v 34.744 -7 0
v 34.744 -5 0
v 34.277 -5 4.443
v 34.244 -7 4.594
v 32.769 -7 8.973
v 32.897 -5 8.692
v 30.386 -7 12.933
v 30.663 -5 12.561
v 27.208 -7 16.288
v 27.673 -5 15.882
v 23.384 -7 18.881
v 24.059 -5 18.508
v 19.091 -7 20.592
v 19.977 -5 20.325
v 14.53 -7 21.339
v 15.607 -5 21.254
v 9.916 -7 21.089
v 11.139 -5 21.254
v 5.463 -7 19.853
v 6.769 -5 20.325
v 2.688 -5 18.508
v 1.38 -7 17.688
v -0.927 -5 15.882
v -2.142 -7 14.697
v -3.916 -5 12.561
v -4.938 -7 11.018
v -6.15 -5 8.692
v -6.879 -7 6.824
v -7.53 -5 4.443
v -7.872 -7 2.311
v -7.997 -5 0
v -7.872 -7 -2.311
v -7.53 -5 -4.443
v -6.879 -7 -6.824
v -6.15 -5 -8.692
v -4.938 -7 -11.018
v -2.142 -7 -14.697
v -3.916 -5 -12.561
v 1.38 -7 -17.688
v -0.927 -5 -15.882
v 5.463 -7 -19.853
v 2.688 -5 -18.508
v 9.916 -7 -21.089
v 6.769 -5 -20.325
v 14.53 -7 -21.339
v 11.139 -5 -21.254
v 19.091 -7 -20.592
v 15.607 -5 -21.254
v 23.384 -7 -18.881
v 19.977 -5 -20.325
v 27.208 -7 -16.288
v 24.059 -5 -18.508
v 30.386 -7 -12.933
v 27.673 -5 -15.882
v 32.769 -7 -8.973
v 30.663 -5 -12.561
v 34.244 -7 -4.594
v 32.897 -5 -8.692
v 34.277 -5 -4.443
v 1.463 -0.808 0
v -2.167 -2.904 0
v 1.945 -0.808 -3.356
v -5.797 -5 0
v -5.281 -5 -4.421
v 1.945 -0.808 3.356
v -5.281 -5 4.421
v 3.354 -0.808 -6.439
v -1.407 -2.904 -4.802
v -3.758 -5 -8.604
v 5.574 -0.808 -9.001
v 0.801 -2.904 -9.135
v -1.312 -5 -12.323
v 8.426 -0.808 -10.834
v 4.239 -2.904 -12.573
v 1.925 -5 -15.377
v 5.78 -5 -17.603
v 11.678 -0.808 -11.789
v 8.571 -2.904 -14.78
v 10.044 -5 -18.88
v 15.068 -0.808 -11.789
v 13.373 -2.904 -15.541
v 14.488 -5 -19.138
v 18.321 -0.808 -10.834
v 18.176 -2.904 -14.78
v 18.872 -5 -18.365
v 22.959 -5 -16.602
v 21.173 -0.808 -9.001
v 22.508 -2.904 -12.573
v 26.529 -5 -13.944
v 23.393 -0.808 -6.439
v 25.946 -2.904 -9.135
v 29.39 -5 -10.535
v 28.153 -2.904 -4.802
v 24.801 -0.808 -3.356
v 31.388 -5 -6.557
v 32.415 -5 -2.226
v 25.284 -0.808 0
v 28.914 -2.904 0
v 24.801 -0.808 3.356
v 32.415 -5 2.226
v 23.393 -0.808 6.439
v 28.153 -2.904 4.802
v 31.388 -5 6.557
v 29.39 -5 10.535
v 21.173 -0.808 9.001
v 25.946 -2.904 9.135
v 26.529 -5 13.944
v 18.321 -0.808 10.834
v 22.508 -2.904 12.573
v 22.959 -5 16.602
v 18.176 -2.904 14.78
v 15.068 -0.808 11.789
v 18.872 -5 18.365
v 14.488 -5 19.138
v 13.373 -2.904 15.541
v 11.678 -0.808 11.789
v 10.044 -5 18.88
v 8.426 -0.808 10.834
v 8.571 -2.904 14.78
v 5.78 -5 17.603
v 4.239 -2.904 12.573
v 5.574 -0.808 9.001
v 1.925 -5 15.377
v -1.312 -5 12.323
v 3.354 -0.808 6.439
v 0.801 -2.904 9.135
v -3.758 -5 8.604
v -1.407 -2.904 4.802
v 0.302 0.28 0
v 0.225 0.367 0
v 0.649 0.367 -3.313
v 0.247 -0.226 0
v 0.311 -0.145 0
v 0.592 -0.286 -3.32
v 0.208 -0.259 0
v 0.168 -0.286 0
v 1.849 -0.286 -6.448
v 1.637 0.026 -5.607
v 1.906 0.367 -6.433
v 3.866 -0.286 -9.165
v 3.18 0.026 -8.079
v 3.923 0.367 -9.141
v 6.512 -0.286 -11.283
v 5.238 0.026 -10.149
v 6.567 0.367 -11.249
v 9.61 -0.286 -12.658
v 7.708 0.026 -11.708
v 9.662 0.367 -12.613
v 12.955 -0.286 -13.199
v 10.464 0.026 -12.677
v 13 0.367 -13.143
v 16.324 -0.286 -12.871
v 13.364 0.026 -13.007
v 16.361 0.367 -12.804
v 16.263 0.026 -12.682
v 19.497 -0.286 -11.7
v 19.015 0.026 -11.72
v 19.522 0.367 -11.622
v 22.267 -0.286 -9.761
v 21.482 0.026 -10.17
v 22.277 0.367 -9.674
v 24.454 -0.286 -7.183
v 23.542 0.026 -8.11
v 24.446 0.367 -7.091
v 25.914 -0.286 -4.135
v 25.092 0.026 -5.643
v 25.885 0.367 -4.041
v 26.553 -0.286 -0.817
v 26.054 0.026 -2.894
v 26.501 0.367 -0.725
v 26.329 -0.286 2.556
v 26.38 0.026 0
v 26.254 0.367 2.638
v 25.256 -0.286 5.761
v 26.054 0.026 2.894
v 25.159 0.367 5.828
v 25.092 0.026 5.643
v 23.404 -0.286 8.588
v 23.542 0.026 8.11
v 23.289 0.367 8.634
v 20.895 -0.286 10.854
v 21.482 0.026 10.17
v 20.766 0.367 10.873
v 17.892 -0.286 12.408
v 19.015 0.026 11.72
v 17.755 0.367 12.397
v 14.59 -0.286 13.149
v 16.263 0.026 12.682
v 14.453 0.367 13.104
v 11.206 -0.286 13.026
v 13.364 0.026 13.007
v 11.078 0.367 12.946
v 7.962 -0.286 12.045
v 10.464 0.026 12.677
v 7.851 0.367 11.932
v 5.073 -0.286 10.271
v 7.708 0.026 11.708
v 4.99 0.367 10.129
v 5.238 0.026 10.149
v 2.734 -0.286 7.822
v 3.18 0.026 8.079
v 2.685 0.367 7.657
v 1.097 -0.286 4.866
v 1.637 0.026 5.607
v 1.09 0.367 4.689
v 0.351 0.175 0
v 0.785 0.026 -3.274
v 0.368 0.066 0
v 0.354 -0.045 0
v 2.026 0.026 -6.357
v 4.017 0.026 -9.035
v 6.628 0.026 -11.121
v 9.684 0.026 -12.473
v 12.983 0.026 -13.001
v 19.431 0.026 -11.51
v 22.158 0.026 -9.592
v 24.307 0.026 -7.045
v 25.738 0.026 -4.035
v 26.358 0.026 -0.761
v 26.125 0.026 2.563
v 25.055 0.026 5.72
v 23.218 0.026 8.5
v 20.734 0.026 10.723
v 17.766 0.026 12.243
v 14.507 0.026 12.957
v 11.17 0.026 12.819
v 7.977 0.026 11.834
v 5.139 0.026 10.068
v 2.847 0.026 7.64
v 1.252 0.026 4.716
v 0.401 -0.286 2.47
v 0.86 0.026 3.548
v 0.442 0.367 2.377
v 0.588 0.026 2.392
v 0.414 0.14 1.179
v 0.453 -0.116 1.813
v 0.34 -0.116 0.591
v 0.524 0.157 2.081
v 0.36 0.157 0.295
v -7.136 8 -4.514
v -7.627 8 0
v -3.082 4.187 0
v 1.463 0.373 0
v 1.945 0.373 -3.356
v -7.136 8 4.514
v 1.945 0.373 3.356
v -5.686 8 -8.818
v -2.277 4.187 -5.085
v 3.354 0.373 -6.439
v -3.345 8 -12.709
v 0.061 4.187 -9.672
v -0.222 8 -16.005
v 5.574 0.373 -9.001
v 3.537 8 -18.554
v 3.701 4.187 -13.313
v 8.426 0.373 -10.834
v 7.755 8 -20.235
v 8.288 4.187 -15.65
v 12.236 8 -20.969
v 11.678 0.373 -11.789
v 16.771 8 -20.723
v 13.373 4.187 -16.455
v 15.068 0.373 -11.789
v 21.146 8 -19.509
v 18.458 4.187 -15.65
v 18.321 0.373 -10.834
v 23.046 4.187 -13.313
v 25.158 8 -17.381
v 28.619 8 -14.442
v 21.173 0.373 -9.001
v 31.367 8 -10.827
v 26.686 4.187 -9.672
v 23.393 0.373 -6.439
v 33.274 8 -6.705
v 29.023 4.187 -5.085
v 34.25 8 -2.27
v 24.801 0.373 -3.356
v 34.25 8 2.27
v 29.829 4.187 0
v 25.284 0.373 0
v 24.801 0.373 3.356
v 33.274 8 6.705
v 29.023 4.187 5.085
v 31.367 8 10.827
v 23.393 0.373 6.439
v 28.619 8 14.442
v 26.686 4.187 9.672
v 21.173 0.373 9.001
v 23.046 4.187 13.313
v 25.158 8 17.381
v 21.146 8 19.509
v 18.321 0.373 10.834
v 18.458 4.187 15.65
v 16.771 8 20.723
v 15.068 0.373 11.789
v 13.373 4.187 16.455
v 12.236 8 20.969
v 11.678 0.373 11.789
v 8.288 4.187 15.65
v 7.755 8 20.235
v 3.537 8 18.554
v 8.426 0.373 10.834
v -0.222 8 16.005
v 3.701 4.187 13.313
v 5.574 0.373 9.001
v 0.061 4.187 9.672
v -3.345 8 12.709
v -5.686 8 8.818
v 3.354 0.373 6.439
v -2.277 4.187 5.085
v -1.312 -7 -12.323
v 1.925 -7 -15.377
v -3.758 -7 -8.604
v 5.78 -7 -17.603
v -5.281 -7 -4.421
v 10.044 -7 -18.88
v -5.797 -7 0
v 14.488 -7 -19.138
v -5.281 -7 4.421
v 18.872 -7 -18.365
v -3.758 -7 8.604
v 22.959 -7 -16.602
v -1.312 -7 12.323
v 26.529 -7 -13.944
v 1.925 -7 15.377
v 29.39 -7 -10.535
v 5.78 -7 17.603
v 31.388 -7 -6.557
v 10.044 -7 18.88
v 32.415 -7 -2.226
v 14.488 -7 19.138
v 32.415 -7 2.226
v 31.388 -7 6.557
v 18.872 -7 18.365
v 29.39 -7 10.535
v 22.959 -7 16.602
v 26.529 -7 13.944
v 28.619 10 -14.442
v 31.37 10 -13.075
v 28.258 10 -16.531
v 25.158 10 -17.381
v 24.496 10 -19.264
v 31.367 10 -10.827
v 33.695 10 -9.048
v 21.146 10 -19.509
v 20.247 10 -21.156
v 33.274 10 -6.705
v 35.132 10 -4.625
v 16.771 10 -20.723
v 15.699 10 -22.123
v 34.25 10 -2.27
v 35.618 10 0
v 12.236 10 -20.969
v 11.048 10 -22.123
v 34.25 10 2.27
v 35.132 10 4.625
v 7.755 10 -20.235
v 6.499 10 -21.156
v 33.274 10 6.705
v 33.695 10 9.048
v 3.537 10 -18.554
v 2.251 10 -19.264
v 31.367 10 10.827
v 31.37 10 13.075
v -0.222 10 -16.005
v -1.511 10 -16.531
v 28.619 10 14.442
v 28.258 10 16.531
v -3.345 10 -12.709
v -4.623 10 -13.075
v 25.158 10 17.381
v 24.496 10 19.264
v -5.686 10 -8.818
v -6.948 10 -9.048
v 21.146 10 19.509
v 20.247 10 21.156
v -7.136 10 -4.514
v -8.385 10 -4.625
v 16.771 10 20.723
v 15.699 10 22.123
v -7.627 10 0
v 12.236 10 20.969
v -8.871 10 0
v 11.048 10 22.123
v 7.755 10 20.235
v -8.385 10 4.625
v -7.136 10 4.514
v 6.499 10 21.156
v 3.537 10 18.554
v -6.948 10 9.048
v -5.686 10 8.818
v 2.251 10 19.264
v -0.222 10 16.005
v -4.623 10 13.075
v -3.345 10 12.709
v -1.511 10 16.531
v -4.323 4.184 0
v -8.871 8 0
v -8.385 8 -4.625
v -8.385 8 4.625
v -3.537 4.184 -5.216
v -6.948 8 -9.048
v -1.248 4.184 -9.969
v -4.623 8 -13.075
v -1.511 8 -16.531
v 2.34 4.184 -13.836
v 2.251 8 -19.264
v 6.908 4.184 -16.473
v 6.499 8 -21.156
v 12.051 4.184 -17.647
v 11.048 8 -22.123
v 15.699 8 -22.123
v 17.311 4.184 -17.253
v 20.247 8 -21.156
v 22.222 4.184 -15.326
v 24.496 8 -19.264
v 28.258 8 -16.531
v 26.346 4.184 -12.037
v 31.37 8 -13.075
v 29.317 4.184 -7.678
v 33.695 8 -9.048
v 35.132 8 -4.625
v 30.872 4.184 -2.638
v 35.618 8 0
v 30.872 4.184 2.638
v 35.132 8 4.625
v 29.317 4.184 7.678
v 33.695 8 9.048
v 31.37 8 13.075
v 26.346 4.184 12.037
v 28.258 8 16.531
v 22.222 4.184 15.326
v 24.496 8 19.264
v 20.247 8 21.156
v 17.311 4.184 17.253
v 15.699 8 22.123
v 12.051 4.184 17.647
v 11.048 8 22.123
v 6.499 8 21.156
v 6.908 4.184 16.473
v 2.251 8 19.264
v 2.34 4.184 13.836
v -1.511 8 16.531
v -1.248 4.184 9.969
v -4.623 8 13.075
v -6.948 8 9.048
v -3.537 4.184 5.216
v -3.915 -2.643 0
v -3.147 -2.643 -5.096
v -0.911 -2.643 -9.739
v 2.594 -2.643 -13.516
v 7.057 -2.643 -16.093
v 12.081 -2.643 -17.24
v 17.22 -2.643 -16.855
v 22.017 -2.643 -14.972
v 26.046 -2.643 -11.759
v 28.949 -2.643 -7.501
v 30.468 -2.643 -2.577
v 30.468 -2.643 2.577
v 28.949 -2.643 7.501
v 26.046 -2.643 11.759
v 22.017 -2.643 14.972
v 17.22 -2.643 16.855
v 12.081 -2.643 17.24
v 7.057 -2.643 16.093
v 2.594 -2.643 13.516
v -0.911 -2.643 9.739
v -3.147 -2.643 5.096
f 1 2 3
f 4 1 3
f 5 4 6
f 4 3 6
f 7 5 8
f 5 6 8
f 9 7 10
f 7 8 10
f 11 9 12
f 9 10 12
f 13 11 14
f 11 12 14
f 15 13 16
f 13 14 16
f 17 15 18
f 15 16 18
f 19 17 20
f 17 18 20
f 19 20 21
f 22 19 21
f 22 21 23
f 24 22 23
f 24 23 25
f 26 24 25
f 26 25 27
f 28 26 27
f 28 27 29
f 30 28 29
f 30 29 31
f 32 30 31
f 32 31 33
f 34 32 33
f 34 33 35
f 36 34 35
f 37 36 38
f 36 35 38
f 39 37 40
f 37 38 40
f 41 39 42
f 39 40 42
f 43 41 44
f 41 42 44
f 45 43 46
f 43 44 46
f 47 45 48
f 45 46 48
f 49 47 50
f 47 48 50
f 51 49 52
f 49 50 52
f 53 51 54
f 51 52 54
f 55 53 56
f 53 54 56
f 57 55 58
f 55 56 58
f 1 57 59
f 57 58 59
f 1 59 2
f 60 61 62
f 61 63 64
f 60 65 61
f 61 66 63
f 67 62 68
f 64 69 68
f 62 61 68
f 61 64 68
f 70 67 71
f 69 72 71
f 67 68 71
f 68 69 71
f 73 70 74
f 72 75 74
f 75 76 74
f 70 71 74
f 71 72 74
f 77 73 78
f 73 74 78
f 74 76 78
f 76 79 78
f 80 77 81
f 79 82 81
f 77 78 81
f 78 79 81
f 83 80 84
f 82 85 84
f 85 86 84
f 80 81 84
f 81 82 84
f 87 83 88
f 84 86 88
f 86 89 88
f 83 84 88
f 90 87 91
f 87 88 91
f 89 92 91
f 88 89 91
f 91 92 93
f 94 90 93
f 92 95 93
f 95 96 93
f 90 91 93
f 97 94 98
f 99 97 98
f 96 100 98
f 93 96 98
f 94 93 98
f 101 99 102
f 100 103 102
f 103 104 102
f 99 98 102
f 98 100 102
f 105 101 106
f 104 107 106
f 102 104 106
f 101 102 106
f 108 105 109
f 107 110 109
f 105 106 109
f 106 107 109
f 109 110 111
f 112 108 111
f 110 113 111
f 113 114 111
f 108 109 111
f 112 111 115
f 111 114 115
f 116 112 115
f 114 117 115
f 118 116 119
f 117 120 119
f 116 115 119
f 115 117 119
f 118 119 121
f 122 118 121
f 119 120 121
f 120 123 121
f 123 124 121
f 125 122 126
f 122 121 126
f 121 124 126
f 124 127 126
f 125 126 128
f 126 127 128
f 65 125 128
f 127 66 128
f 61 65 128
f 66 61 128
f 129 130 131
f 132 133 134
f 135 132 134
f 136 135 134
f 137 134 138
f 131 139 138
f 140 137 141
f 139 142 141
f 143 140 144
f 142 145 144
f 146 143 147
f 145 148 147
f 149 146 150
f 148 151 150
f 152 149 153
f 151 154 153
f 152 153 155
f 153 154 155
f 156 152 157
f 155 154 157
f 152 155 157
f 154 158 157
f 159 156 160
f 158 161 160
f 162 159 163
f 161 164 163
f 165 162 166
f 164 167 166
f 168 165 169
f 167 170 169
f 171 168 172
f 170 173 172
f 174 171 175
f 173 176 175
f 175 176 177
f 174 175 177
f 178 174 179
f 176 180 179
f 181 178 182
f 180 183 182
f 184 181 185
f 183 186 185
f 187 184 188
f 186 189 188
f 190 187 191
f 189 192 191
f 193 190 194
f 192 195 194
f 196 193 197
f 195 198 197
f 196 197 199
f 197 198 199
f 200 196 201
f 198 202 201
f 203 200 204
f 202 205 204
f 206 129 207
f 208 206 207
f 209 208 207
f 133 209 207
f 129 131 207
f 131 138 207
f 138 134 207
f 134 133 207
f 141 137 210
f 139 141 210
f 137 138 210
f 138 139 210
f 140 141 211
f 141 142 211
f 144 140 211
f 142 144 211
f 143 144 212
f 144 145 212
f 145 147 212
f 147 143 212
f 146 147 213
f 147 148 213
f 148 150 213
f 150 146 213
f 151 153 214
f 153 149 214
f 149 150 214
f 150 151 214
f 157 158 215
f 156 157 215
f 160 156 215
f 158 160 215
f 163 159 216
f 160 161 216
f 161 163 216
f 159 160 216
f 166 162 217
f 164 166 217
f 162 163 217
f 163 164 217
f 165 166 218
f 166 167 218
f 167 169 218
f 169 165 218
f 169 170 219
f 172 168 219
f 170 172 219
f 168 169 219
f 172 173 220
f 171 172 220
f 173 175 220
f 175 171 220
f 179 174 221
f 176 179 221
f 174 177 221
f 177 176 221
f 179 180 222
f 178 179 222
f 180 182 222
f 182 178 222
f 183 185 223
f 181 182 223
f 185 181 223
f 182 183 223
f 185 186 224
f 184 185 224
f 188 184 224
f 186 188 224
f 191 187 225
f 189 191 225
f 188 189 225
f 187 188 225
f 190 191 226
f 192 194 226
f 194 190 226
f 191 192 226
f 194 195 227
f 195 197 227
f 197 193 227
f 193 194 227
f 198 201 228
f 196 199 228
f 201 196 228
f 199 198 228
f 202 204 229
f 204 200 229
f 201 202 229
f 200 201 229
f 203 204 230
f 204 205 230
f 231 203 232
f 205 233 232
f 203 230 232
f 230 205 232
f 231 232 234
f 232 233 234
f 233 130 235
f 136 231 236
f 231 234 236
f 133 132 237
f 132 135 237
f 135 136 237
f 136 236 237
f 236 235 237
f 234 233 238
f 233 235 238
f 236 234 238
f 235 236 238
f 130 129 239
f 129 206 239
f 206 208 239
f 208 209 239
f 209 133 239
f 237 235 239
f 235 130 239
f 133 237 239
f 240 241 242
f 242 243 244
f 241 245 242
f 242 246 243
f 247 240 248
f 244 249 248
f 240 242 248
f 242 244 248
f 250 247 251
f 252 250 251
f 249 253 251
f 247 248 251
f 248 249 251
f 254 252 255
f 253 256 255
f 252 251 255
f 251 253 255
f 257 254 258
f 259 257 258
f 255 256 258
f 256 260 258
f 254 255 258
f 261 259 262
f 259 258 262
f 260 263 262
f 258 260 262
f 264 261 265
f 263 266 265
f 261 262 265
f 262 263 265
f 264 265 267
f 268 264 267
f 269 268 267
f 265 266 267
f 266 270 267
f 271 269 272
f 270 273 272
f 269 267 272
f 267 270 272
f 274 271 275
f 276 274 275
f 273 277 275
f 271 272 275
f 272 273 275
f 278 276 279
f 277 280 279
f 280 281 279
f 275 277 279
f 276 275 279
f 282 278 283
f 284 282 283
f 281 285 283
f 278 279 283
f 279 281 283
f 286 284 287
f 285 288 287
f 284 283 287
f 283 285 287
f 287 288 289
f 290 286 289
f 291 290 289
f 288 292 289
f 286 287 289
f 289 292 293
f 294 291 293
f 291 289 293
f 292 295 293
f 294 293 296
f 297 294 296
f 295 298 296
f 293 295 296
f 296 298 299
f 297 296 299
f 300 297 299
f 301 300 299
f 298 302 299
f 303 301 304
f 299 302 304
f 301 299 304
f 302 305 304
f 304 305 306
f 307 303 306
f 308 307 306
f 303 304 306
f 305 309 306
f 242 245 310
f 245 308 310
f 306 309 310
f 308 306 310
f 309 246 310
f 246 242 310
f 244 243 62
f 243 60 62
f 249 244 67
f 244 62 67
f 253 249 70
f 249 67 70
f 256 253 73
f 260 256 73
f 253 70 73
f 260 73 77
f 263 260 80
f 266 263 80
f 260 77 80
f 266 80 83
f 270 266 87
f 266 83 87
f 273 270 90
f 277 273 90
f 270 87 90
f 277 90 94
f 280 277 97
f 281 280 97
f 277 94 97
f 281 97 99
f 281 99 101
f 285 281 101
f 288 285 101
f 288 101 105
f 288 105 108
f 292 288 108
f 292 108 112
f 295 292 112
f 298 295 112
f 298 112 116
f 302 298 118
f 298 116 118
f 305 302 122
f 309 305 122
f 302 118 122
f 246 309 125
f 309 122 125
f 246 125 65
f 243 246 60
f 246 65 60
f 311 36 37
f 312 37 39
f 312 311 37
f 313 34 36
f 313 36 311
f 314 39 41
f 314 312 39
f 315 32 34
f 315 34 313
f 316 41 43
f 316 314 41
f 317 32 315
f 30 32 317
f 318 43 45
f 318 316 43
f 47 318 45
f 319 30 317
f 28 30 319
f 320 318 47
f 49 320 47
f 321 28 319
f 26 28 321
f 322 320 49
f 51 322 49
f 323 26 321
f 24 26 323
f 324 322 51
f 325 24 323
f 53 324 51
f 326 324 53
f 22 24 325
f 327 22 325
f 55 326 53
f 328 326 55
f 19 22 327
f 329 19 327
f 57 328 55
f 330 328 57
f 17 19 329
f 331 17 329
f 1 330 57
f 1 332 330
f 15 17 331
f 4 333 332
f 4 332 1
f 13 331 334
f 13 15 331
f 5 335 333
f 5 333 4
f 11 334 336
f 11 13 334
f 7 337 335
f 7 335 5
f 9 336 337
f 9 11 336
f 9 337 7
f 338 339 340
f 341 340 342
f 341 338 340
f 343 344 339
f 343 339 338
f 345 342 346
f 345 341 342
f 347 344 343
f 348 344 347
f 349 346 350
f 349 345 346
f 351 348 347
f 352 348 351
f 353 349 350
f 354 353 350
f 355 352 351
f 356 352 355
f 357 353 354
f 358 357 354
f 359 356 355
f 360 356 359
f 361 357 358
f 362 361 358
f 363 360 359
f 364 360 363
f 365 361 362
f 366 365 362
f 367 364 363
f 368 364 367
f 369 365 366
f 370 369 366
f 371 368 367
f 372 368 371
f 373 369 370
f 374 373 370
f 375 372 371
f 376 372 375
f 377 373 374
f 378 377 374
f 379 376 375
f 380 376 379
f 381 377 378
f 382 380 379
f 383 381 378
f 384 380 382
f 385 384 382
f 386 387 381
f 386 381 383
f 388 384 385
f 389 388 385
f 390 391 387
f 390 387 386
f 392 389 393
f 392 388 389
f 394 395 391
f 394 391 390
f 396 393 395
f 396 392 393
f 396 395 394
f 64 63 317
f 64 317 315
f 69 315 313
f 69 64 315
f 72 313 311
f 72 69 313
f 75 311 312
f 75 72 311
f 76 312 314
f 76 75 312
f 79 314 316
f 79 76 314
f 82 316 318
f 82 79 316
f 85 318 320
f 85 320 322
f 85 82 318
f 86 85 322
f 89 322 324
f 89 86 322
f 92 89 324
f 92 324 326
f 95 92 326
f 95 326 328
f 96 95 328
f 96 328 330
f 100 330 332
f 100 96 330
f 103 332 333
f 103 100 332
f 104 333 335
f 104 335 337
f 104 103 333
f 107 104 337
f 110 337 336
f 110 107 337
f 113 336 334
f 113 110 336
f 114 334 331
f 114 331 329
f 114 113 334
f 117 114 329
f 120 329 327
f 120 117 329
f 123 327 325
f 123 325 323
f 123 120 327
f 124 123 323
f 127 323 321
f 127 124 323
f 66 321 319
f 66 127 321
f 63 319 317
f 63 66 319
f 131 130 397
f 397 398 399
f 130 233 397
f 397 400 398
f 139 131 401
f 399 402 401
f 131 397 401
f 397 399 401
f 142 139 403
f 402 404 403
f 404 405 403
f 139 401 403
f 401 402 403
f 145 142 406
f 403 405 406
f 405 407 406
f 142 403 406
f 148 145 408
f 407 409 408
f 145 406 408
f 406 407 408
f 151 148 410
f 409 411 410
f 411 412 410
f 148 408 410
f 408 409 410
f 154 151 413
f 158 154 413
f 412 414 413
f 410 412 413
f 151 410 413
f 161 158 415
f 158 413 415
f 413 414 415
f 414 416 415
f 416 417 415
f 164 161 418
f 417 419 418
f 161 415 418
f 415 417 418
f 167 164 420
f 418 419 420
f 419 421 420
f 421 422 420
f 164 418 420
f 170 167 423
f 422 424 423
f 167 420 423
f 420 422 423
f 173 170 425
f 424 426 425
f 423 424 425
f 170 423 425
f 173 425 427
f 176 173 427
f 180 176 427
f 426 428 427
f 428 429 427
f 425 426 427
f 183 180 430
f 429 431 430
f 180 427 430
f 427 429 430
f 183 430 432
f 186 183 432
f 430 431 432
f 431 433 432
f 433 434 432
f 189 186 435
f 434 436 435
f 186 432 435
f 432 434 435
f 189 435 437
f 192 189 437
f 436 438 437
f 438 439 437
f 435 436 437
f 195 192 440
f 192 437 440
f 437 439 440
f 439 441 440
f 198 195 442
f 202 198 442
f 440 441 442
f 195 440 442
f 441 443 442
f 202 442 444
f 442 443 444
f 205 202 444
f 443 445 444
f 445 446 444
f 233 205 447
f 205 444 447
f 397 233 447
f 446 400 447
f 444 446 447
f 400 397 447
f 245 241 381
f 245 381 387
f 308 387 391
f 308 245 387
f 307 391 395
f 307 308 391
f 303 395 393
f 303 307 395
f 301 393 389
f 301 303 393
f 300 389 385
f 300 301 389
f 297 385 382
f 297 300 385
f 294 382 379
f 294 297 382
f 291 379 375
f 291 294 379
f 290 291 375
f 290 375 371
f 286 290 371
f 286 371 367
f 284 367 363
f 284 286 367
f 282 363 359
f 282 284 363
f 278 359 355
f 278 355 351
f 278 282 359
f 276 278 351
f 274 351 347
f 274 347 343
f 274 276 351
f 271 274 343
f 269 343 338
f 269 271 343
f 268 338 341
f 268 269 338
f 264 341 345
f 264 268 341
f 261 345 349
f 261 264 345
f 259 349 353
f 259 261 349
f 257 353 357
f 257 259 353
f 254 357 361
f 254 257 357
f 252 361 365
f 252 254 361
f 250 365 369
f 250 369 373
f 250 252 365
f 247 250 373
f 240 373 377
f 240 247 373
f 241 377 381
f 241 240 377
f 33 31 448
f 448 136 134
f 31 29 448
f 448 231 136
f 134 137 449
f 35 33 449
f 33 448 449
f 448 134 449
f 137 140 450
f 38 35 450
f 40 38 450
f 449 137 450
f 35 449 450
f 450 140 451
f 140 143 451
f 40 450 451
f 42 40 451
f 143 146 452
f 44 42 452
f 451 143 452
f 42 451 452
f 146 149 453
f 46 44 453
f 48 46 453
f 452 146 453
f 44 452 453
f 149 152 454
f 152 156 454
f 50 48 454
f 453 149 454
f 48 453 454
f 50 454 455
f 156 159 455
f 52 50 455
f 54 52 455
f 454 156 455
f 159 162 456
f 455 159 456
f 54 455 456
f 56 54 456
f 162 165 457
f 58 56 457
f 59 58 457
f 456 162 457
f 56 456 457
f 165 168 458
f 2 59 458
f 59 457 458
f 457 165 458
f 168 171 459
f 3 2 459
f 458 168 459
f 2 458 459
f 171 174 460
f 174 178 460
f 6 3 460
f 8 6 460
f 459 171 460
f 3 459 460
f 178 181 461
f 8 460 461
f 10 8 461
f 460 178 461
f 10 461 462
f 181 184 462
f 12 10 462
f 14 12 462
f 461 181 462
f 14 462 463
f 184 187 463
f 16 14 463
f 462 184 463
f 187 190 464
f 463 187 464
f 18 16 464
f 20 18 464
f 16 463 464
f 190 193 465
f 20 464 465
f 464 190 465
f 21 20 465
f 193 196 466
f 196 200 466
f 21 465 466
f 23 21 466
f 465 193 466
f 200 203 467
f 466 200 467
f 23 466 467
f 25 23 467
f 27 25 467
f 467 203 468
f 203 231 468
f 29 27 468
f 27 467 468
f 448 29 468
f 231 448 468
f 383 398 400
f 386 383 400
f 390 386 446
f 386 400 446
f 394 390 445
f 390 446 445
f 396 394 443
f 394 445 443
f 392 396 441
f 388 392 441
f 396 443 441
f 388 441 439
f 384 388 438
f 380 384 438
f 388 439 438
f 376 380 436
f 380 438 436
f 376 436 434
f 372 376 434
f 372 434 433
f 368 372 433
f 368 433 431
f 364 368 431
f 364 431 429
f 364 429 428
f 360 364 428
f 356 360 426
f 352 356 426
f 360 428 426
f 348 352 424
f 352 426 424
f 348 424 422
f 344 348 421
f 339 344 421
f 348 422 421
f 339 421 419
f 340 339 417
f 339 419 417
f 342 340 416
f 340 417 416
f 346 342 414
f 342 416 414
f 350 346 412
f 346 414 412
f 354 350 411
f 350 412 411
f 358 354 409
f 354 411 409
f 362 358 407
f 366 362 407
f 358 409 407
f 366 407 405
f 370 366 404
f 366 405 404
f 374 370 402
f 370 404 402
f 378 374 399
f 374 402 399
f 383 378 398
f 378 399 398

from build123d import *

# Parameters (mm, degrees)
FILLET2_R           = 0.4
SKETCH2_R           = 22.244579061
SKETCH2_R_2         = 21
BOSS_EXTRUDE1_DEPTH = 2
SKETCH3_R           = 21.370804359
SKETCH3_R_2         = 19.170804359
BOSS_EXTRUDE2_DEPTH = 2


with BuildPart() as part:
    # Sketch1 → Revolve1 (revolve)
    with BuildSketch(Plane.XY):
        Polygon((0.662781953, 0), (-8.871246788, 8), (-7.626667727, 8), (1.462781953, 0.373046127), (1.462781953, -0.808290377), (-5.797472085, -5), (-7.997472085, -5), align=None)
    revolve(axis=Axis((13.373332273, 7.609018033, 0), (0, -1, 0)))

    # Fillet2
    fillet2_edges = [part.edges().sort_by_distance(p)[0] for p in [
        (26.083882594, 0, 0),
    ]]
    fillet(fillet2_edges, radius=FILLET2_R)

    # Sketch2 → Boss-Extrude1 (add)
    with BuildSketch(Plane(origin=(0, 8, 0), x_dir=(1, 0, 0), z_dir=(0, 1, 0))):
        with Locations(Location((13.373332273, 0, 0), (0, 0, 180))):
            Circle(SKETCH2_R)
        with Locations(Location((13.373332273, 0, 0), (0, 0, 180))):
            Circle(SKETCH2_R_2, mode=Mode.SUBTRACT)
    extrude(amount=BOSS_EXTRUDE1_DEPTH)

    # Sketch3 → Boss-Extrude2 (add)
    with BuildSketch(Plane.XZ.offset(5)):
        with Locations((13.373332273, 0)):
            Circle(SKETCH3_R)
        with Locations(Location((13.373332273, 0, 0), (0, 0, 180))):
            Circle(SKETCH3_R_2, mode=Mode.SUBTRACT)
    extrude(amount=BOSS_EXTRUDE2_DEPTH)


solid = part.part
